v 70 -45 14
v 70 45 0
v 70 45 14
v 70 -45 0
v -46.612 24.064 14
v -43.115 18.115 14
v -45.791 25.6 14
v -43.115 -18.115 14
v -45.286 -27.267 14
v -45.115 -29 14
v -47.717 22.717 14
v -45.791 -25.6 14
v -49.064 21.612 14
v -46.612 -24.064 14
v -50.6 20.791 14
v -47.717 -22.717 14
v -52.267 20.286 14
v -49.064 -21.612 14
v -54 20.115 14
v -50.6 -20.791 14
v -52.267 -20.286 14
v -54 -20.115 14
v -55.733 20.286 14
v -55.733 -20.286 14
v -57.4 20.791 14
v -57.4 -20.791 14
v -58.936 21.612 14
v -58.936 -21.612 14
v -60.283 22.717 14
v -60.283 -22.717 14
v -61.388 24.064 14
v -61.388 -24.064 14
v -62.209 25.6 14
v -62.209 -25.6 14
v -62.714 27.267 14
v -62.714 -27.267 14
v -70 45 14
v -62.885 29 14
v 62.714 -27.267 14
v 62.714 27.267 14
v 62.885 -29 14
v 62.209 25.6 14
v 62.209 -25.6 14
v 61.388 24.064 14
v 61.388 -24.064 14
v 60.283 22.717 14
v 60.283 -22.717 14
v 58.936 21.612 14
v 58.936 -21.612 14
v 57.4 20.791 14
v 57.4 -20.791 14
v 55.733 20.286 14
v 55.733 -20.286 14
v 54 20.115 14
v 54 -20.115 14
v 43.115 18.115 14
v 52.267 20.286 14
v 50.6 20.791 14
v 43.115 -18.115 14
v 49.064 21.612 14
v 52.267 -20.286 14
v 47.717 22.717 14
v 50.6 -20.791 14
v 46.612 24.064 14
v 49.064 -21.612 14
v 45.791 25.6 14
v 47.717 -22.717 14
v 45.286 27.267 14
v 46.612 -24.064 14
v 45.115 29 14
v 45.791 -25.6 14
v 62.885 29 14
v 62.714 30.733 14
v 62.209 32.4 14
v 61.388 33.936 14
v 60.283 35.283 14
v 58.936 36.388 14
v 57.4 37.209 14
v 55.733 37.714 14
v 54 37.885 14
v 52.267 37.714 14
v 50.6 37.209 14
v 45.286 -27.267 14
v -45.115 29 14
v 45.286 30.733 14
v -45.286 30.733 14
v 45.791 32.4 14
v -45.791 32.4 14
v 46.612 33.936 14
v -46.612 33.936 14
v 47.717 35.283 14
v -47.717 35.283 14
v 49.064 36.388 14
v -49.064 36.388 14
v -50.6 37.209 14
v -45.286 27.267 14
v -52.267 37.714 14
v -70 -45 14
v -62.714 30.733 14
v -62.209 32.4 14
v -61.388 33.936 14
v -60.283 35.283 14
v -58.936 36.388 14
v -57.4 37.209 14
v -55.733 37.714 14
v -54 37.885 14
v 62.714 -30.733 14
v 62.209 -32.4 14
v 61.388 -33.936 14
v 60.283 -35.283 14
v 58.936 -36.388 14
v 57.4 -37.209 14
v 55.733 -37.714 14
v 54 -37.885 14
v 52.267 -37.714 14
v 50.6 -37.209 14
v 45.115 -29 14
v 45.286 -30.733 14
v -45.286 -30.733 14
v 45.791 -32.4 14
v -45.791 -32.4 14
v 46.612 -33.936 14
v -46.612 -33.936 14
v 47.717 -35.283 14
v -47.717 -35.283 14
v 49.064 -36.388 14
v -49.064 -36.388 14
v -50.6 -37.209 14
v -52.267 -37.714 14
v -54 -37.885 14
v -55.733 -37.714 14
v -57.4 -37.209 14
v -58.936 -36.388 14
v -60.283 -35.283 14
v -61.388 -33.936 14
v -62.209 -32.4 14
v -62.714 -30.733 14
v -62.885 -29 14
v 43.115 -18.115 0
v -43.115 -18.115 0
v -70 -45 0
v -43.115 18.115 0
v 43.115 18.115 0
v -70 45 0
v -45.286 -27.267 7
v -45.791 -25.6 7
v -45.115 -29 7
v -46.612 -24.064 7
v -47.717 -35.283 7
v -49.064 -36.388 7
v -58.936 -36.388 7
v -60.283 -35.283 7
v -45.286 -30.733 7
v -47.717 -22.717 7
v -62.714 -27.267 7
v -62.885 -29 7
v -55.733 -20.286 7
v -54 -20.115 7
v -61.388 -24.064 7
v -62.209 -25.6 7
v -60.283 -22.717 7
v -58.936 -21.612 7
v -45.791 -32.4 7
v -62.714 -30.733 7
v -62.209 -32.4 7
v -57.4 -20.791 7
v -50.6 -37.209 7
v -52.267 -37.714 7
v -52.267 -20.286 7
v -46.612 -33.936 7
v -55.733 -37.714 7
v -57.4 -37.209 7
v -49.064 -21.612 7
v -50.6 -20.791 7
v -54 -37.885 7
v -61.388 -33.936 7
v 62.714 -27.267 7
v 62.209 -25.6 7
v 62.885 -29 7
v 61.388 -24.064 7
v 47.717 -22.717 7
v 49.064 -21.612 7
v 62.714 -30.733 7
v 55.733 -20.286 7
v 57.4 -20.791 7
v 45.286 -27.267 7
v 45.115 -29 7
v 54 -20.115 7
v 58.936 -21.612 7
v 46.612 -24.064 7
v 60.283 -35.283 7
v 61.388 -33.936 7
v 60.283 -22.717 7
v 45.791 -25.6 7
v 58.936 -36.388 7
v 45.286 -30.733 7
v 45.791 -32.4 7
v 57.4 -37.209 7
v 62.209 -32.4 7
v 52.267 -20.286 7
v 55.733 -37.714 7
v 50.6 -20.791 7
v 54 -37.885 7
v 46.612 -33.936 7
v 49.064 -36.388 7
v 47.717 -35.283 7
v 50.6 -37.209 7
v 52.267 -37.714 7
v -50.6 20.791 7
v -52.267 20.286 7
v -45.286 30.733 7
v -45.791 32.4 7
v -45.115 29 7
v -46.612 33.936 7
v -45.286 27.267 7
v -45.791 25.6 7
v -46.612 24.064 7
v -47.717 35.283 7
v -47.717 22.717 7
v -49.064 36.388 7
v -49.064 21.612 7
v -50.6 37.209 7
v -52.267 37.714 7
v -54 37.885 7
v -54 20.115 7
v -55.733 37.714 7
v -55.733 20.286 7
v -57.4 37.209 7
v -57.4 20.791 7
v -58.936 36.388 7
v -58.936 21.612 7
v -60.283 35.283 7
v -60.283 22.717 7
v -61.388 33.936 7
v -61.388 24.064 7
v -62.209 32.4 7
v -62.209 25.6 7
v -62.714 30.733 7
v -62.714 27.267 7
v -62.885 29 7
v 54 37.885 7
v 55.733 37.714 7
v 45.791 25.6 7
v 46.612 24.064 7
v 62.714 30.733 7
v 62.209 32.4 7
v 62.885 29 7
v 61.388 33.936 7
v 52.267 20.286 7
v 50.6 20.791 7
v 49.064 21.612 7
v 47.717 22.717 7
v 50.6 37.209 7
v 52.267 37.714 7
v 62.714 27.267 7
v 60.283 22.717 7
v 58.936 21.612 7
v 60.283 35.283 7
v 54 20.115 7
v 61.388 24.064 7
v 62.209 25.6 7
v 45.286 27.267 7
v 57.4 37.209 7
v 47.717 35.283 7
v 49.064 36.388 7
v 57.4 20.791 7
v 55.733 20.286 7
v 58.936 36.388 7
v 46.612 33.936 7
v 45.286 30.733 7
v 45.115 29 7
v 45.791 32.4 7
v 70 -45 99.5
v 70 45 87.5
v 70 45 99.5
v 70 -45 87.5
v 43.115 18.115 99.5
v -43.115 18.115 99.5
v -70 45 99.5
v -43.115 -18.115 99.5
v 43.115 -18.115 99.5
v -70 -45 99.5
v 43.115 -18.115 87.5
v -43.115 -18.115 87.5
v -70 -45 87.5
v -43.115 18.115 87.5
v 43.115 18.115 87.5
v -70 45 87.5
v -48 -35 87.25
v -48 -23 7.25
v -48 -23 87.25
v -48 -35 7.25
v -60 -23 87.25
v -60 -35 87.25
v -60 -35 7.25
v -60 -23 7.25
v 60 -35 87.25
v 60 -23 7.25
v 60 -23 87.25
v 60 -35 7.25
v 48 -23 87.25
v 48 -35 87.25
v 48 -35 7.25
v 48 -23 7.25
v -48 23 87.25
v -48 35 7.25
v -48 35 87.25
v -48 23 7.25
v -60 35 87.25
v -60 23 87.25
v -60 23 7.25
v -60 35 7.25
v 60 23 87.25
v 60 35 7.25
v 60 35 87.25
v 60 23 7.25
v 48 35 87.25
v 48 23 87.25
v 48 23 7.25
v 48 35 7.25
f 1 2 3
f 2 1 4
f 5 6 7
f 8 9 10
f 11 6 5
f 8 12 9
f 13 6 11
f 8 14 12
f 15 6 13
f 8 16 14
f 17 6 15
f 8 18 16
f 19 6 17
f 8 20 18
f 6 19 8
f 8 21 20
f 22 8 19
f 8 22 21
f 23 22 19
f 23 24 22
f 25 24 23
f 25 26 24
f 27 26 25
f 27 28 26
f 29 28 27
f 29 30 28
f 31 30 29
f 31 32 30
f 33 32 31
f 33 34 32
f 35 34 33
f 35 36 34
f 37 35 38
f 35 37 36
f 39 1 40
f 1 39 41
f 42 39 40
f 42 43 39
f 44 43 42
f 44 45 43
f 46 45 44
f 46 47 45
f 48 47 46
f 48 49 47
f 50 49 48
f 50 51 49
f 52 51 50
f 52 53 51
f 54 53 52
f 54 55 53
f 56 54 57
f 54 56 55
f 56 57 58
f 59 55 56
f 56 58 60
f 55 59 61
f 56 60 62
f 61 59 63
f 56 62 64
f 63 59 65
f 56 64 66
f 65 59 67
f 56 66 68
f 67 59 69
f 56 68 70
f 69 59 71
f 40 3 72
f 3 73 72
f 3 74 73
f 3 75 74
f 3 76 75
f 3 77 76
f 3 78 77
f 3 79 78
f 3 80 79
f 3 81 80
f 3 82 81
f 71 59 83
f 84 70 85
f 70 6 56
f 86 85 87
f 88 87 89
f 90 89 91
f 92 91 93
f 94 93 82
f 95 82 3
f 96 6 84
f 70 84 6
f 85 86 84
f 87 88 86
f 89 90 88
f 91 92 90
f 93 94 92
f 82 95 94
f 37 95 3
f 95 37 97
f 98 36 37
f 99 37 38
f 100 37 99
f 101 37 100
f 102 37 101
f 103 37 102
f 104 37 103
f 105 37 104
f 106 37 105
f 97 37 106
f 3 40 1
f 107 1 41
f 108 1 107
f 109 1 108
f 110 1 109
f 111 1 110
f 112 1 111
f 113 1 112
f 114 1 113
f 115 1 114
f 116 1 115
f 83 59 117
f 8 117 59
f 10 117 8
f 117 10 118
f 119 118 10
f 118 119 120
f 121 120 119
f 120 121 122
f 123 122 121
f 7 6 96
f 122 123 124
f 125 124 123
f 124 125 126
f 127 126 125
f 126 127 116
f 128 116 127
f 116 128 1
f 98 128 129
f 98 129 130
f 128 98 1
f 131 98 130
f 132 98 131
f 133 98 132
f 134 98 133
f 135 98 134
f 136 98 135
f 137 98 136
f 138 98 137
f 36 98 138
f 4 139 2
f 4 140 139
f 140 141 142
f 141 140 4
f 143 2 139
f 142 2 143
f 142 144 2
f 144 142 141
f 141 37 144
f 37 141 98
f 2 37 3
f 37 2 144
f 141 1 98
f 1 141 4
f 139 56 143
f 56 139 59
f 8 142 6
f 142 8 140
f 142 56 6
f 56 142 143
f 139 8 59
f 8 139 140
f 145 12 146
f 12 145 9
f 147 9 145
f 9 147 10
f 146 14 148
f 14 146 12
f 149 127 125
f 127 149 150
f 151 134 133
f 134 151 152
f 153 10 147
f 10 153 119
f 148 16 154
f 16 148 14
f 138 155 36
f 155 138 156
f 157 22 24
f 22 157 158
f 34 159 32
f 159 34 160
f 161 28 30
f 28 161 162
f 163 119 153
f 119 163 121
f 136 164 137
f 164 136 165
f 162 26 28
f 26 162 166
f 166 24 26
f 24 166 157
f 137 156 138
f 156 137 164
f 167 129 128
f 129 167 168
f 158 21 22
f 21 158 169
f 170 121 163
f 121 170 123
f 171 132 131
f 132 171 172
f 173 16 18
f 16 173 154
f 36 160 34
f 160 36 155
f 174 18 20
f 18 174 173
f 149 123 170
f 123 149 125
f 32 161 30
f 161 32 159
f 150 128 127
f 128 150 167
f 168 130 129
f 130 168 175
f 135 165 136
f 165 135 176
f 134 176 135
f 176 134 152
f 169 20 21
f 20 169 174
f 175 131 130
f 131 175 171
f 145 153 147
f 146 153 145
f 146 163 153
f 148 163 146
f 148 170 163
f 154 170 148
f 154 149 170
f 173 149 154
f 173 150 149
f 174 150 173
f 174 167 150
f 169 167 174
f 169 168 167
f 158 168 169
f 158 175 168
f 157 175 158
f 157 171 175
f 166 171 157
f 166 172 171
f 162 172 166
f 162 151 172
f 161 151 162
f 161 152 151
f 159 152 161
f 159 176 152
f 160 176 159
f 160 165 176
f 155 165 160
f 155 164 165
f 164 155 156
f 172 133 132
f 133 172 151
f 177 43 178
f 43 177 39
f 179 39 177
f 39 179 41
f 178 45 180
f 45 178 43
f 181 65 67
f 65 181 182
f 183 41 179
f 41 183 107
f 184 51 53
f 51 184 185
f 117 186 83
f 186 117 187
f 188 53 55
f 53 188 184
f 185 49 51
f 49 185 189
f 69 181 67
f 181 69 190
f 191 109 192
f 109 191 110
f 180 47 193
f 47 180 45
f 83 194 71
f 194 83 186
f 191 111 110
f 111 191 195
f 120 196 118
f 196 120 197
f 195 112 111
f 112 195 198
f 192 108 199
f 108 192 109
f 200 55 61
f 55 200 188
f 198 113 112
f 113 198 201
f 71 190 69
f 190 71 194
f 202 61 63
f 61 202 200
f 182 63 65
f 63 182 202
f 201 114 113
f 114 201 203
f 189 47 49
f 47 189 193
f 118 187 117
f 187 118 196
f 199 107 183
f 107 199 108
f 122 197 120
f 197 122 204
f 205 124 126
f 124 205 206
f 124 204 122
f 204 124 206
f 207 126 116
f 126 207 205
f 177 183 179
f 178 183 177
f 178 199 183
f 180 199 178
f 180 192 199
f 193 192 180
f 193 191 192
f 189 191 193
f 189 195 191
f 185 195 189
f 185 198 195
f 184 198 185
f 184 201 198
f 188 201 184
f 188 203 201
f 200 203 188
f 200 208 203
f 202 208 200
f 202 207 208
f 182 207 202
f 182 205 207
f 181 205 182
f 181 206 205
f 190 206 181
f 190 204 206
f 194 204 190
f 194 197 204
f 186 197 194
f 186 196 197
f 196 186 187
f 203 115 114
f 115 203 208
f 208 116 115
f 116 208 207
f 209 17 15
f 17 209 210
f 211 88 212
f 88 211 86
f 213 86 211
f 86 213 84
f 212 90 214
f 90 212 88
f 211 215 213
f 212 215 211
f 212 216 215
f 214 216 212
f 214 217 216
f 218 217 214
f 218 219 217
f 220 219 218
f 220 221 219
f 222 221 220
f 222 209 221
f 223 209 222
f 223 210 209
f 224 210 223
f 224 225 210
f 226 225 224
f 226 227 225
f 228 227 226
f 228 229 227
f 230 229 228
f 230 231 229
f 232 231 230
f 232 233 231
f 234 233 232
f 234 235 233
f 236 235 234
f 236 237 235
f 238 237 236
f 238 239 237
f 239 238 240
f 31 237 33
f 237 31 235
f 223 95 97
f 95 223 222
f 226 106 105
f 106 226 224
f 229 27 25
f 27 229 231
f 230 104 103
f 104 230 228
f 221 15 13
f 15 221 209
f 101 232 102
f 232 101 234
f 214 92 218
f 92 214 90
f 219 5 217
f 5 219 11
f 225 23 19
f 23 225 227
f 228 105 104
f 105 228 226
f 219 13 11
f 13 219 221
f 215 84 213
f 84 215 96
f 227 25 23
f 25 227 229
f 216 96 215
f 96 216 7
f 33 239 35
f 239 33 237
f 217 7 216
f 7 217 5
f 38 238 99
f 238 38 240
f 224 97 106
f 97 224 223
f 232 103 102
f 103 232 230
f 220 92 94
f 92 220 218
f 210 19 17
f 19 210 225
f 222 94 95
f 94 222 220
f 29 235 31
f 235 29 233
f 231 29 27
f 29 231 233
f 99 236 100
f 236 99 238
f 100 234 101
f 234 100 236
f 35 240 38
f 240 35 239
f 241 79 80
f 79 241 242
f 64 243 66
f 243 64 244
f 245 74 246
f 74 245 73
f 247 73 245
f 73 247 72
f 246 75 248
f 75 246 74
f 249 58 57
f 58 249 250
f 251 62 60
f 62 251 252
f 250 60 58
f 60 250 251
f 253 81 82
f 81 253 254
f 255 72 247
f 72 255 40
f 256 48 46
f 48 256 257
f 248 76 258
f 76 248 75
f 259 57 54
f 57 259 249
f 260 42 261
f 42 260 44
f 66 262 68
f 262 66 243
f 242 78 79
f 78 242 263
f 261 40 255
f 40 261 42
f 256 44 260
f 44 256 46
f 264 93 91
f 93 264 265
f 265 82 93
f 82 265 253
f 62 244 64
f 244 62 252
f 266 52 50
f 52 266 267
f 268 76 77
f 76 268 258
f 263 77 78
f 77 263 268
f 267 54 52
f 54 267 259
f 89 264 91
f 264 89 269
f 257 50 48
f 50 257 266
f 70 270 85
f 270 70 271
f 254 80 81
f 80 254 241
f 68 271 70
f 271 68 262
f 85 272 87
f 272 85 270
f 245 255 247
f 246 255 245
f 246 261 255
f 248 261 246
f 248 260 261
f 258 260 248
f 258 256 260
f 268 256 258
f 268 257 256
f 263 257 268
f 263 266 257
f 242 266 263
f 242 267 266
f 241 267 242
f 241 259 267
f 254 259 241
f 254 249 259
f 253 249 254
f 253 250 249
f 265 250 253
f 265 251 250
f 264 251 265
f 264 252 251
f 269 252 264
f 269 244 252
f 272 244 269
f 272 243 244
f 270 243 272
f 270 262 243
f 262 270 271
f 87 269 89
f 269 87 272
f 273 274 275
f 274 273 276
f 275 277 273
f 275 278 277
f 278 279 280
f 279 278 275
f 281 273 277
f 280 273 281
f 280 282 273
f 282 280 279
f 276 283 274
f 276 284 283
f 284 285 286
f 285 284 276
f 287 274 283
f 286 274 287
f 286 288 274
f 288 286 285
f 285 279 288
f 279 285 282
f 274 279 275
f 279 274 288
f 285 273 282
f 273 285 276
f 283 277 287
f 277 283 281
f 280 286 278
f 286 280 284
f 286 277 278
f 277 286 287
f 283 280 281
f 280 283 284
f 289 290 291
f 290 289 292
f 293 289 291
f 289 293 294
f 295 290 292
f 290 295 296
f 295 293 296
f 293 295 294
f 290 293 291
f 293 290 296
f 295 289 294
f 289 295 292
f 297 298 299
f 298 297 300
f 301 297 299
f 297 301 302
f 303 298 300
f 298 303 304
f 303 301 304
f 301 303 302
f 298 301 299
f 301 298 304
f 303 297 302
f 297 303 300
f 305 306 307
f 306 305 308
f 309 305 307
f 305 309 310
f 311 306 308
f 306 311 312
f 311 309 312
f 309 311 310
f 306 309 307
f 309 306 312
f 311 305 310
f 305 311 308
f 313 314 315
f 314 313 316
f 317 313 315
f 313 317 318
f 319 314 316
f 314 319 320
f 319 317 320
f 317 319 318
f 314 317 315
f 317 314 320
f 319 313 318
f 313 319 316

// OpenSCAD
$fn = 32;

// ------------------------------------------------------------------------
// Frame cube: base 140 x 90 mm, posts 80 mm tall
// Every part is its own module, assembly() places every instance.
// ------------------------------------------------------------------------

// --- part 1 ---
module base_frame() {
  difference() {
    translate([-70, -45, 0]) cube([140, 90, 14]);
    translate([-43.115, -18.115, -1]) cube([86.23, 36.23, 16]);
    translate([-54, -29, 7]) cylinder(h = 8, d = 17.77);
    translate([54, -29, 7]) cylinder(h = 8, d = 17.77);
    translate([-54, 29, 7]) cylinder(h = 8, d = 17.77);
    translate([54, 29, 7]) cylinder(h = 8, d = 17.77);
  }
}

// --- part 2 ---
module corner_post() {
  translate([-6, -6, 0]) cube([12, 12, 80]);
}

// --- part 3 ---
module top_frame() {
  difference() {
    translate([-70, -45, 0]) cube([140, 90, 12]);
    translate([-43.115, -18.115, -1]) cube([86.23, 36.23, 14]);
  }
}

// --- assembly ---
module assembly() {
  color([0.80, 0.24, 0.20]) translate([0, 0, 0]) rotate([0, 0, 0]) base_frame();
  color([0.20, 0.45, 0.75]) translate([-54, -29, 7.25]) rotate([0, 0, 0]) corner_post();
  color([0.25, 0.62, 0.32]) translate([54, -29, 7.25]) rotate([0, 0, 0]) corner_post();
  color([0.92, 0.70, 0.18]) translate([-54, 29, 7.25]) rotate([0, 0, 0]) corner_post();
  color([0.58, 0.35, 0.70]) translate([54, 29, 7.25]) rotate([0, 0, 0]) corner_post();
  color([0.16, 0.66, 0.66]) translate([0, 0, 87.5]) rotate([0, 0, 0]) top_frame();
}

assembly();
